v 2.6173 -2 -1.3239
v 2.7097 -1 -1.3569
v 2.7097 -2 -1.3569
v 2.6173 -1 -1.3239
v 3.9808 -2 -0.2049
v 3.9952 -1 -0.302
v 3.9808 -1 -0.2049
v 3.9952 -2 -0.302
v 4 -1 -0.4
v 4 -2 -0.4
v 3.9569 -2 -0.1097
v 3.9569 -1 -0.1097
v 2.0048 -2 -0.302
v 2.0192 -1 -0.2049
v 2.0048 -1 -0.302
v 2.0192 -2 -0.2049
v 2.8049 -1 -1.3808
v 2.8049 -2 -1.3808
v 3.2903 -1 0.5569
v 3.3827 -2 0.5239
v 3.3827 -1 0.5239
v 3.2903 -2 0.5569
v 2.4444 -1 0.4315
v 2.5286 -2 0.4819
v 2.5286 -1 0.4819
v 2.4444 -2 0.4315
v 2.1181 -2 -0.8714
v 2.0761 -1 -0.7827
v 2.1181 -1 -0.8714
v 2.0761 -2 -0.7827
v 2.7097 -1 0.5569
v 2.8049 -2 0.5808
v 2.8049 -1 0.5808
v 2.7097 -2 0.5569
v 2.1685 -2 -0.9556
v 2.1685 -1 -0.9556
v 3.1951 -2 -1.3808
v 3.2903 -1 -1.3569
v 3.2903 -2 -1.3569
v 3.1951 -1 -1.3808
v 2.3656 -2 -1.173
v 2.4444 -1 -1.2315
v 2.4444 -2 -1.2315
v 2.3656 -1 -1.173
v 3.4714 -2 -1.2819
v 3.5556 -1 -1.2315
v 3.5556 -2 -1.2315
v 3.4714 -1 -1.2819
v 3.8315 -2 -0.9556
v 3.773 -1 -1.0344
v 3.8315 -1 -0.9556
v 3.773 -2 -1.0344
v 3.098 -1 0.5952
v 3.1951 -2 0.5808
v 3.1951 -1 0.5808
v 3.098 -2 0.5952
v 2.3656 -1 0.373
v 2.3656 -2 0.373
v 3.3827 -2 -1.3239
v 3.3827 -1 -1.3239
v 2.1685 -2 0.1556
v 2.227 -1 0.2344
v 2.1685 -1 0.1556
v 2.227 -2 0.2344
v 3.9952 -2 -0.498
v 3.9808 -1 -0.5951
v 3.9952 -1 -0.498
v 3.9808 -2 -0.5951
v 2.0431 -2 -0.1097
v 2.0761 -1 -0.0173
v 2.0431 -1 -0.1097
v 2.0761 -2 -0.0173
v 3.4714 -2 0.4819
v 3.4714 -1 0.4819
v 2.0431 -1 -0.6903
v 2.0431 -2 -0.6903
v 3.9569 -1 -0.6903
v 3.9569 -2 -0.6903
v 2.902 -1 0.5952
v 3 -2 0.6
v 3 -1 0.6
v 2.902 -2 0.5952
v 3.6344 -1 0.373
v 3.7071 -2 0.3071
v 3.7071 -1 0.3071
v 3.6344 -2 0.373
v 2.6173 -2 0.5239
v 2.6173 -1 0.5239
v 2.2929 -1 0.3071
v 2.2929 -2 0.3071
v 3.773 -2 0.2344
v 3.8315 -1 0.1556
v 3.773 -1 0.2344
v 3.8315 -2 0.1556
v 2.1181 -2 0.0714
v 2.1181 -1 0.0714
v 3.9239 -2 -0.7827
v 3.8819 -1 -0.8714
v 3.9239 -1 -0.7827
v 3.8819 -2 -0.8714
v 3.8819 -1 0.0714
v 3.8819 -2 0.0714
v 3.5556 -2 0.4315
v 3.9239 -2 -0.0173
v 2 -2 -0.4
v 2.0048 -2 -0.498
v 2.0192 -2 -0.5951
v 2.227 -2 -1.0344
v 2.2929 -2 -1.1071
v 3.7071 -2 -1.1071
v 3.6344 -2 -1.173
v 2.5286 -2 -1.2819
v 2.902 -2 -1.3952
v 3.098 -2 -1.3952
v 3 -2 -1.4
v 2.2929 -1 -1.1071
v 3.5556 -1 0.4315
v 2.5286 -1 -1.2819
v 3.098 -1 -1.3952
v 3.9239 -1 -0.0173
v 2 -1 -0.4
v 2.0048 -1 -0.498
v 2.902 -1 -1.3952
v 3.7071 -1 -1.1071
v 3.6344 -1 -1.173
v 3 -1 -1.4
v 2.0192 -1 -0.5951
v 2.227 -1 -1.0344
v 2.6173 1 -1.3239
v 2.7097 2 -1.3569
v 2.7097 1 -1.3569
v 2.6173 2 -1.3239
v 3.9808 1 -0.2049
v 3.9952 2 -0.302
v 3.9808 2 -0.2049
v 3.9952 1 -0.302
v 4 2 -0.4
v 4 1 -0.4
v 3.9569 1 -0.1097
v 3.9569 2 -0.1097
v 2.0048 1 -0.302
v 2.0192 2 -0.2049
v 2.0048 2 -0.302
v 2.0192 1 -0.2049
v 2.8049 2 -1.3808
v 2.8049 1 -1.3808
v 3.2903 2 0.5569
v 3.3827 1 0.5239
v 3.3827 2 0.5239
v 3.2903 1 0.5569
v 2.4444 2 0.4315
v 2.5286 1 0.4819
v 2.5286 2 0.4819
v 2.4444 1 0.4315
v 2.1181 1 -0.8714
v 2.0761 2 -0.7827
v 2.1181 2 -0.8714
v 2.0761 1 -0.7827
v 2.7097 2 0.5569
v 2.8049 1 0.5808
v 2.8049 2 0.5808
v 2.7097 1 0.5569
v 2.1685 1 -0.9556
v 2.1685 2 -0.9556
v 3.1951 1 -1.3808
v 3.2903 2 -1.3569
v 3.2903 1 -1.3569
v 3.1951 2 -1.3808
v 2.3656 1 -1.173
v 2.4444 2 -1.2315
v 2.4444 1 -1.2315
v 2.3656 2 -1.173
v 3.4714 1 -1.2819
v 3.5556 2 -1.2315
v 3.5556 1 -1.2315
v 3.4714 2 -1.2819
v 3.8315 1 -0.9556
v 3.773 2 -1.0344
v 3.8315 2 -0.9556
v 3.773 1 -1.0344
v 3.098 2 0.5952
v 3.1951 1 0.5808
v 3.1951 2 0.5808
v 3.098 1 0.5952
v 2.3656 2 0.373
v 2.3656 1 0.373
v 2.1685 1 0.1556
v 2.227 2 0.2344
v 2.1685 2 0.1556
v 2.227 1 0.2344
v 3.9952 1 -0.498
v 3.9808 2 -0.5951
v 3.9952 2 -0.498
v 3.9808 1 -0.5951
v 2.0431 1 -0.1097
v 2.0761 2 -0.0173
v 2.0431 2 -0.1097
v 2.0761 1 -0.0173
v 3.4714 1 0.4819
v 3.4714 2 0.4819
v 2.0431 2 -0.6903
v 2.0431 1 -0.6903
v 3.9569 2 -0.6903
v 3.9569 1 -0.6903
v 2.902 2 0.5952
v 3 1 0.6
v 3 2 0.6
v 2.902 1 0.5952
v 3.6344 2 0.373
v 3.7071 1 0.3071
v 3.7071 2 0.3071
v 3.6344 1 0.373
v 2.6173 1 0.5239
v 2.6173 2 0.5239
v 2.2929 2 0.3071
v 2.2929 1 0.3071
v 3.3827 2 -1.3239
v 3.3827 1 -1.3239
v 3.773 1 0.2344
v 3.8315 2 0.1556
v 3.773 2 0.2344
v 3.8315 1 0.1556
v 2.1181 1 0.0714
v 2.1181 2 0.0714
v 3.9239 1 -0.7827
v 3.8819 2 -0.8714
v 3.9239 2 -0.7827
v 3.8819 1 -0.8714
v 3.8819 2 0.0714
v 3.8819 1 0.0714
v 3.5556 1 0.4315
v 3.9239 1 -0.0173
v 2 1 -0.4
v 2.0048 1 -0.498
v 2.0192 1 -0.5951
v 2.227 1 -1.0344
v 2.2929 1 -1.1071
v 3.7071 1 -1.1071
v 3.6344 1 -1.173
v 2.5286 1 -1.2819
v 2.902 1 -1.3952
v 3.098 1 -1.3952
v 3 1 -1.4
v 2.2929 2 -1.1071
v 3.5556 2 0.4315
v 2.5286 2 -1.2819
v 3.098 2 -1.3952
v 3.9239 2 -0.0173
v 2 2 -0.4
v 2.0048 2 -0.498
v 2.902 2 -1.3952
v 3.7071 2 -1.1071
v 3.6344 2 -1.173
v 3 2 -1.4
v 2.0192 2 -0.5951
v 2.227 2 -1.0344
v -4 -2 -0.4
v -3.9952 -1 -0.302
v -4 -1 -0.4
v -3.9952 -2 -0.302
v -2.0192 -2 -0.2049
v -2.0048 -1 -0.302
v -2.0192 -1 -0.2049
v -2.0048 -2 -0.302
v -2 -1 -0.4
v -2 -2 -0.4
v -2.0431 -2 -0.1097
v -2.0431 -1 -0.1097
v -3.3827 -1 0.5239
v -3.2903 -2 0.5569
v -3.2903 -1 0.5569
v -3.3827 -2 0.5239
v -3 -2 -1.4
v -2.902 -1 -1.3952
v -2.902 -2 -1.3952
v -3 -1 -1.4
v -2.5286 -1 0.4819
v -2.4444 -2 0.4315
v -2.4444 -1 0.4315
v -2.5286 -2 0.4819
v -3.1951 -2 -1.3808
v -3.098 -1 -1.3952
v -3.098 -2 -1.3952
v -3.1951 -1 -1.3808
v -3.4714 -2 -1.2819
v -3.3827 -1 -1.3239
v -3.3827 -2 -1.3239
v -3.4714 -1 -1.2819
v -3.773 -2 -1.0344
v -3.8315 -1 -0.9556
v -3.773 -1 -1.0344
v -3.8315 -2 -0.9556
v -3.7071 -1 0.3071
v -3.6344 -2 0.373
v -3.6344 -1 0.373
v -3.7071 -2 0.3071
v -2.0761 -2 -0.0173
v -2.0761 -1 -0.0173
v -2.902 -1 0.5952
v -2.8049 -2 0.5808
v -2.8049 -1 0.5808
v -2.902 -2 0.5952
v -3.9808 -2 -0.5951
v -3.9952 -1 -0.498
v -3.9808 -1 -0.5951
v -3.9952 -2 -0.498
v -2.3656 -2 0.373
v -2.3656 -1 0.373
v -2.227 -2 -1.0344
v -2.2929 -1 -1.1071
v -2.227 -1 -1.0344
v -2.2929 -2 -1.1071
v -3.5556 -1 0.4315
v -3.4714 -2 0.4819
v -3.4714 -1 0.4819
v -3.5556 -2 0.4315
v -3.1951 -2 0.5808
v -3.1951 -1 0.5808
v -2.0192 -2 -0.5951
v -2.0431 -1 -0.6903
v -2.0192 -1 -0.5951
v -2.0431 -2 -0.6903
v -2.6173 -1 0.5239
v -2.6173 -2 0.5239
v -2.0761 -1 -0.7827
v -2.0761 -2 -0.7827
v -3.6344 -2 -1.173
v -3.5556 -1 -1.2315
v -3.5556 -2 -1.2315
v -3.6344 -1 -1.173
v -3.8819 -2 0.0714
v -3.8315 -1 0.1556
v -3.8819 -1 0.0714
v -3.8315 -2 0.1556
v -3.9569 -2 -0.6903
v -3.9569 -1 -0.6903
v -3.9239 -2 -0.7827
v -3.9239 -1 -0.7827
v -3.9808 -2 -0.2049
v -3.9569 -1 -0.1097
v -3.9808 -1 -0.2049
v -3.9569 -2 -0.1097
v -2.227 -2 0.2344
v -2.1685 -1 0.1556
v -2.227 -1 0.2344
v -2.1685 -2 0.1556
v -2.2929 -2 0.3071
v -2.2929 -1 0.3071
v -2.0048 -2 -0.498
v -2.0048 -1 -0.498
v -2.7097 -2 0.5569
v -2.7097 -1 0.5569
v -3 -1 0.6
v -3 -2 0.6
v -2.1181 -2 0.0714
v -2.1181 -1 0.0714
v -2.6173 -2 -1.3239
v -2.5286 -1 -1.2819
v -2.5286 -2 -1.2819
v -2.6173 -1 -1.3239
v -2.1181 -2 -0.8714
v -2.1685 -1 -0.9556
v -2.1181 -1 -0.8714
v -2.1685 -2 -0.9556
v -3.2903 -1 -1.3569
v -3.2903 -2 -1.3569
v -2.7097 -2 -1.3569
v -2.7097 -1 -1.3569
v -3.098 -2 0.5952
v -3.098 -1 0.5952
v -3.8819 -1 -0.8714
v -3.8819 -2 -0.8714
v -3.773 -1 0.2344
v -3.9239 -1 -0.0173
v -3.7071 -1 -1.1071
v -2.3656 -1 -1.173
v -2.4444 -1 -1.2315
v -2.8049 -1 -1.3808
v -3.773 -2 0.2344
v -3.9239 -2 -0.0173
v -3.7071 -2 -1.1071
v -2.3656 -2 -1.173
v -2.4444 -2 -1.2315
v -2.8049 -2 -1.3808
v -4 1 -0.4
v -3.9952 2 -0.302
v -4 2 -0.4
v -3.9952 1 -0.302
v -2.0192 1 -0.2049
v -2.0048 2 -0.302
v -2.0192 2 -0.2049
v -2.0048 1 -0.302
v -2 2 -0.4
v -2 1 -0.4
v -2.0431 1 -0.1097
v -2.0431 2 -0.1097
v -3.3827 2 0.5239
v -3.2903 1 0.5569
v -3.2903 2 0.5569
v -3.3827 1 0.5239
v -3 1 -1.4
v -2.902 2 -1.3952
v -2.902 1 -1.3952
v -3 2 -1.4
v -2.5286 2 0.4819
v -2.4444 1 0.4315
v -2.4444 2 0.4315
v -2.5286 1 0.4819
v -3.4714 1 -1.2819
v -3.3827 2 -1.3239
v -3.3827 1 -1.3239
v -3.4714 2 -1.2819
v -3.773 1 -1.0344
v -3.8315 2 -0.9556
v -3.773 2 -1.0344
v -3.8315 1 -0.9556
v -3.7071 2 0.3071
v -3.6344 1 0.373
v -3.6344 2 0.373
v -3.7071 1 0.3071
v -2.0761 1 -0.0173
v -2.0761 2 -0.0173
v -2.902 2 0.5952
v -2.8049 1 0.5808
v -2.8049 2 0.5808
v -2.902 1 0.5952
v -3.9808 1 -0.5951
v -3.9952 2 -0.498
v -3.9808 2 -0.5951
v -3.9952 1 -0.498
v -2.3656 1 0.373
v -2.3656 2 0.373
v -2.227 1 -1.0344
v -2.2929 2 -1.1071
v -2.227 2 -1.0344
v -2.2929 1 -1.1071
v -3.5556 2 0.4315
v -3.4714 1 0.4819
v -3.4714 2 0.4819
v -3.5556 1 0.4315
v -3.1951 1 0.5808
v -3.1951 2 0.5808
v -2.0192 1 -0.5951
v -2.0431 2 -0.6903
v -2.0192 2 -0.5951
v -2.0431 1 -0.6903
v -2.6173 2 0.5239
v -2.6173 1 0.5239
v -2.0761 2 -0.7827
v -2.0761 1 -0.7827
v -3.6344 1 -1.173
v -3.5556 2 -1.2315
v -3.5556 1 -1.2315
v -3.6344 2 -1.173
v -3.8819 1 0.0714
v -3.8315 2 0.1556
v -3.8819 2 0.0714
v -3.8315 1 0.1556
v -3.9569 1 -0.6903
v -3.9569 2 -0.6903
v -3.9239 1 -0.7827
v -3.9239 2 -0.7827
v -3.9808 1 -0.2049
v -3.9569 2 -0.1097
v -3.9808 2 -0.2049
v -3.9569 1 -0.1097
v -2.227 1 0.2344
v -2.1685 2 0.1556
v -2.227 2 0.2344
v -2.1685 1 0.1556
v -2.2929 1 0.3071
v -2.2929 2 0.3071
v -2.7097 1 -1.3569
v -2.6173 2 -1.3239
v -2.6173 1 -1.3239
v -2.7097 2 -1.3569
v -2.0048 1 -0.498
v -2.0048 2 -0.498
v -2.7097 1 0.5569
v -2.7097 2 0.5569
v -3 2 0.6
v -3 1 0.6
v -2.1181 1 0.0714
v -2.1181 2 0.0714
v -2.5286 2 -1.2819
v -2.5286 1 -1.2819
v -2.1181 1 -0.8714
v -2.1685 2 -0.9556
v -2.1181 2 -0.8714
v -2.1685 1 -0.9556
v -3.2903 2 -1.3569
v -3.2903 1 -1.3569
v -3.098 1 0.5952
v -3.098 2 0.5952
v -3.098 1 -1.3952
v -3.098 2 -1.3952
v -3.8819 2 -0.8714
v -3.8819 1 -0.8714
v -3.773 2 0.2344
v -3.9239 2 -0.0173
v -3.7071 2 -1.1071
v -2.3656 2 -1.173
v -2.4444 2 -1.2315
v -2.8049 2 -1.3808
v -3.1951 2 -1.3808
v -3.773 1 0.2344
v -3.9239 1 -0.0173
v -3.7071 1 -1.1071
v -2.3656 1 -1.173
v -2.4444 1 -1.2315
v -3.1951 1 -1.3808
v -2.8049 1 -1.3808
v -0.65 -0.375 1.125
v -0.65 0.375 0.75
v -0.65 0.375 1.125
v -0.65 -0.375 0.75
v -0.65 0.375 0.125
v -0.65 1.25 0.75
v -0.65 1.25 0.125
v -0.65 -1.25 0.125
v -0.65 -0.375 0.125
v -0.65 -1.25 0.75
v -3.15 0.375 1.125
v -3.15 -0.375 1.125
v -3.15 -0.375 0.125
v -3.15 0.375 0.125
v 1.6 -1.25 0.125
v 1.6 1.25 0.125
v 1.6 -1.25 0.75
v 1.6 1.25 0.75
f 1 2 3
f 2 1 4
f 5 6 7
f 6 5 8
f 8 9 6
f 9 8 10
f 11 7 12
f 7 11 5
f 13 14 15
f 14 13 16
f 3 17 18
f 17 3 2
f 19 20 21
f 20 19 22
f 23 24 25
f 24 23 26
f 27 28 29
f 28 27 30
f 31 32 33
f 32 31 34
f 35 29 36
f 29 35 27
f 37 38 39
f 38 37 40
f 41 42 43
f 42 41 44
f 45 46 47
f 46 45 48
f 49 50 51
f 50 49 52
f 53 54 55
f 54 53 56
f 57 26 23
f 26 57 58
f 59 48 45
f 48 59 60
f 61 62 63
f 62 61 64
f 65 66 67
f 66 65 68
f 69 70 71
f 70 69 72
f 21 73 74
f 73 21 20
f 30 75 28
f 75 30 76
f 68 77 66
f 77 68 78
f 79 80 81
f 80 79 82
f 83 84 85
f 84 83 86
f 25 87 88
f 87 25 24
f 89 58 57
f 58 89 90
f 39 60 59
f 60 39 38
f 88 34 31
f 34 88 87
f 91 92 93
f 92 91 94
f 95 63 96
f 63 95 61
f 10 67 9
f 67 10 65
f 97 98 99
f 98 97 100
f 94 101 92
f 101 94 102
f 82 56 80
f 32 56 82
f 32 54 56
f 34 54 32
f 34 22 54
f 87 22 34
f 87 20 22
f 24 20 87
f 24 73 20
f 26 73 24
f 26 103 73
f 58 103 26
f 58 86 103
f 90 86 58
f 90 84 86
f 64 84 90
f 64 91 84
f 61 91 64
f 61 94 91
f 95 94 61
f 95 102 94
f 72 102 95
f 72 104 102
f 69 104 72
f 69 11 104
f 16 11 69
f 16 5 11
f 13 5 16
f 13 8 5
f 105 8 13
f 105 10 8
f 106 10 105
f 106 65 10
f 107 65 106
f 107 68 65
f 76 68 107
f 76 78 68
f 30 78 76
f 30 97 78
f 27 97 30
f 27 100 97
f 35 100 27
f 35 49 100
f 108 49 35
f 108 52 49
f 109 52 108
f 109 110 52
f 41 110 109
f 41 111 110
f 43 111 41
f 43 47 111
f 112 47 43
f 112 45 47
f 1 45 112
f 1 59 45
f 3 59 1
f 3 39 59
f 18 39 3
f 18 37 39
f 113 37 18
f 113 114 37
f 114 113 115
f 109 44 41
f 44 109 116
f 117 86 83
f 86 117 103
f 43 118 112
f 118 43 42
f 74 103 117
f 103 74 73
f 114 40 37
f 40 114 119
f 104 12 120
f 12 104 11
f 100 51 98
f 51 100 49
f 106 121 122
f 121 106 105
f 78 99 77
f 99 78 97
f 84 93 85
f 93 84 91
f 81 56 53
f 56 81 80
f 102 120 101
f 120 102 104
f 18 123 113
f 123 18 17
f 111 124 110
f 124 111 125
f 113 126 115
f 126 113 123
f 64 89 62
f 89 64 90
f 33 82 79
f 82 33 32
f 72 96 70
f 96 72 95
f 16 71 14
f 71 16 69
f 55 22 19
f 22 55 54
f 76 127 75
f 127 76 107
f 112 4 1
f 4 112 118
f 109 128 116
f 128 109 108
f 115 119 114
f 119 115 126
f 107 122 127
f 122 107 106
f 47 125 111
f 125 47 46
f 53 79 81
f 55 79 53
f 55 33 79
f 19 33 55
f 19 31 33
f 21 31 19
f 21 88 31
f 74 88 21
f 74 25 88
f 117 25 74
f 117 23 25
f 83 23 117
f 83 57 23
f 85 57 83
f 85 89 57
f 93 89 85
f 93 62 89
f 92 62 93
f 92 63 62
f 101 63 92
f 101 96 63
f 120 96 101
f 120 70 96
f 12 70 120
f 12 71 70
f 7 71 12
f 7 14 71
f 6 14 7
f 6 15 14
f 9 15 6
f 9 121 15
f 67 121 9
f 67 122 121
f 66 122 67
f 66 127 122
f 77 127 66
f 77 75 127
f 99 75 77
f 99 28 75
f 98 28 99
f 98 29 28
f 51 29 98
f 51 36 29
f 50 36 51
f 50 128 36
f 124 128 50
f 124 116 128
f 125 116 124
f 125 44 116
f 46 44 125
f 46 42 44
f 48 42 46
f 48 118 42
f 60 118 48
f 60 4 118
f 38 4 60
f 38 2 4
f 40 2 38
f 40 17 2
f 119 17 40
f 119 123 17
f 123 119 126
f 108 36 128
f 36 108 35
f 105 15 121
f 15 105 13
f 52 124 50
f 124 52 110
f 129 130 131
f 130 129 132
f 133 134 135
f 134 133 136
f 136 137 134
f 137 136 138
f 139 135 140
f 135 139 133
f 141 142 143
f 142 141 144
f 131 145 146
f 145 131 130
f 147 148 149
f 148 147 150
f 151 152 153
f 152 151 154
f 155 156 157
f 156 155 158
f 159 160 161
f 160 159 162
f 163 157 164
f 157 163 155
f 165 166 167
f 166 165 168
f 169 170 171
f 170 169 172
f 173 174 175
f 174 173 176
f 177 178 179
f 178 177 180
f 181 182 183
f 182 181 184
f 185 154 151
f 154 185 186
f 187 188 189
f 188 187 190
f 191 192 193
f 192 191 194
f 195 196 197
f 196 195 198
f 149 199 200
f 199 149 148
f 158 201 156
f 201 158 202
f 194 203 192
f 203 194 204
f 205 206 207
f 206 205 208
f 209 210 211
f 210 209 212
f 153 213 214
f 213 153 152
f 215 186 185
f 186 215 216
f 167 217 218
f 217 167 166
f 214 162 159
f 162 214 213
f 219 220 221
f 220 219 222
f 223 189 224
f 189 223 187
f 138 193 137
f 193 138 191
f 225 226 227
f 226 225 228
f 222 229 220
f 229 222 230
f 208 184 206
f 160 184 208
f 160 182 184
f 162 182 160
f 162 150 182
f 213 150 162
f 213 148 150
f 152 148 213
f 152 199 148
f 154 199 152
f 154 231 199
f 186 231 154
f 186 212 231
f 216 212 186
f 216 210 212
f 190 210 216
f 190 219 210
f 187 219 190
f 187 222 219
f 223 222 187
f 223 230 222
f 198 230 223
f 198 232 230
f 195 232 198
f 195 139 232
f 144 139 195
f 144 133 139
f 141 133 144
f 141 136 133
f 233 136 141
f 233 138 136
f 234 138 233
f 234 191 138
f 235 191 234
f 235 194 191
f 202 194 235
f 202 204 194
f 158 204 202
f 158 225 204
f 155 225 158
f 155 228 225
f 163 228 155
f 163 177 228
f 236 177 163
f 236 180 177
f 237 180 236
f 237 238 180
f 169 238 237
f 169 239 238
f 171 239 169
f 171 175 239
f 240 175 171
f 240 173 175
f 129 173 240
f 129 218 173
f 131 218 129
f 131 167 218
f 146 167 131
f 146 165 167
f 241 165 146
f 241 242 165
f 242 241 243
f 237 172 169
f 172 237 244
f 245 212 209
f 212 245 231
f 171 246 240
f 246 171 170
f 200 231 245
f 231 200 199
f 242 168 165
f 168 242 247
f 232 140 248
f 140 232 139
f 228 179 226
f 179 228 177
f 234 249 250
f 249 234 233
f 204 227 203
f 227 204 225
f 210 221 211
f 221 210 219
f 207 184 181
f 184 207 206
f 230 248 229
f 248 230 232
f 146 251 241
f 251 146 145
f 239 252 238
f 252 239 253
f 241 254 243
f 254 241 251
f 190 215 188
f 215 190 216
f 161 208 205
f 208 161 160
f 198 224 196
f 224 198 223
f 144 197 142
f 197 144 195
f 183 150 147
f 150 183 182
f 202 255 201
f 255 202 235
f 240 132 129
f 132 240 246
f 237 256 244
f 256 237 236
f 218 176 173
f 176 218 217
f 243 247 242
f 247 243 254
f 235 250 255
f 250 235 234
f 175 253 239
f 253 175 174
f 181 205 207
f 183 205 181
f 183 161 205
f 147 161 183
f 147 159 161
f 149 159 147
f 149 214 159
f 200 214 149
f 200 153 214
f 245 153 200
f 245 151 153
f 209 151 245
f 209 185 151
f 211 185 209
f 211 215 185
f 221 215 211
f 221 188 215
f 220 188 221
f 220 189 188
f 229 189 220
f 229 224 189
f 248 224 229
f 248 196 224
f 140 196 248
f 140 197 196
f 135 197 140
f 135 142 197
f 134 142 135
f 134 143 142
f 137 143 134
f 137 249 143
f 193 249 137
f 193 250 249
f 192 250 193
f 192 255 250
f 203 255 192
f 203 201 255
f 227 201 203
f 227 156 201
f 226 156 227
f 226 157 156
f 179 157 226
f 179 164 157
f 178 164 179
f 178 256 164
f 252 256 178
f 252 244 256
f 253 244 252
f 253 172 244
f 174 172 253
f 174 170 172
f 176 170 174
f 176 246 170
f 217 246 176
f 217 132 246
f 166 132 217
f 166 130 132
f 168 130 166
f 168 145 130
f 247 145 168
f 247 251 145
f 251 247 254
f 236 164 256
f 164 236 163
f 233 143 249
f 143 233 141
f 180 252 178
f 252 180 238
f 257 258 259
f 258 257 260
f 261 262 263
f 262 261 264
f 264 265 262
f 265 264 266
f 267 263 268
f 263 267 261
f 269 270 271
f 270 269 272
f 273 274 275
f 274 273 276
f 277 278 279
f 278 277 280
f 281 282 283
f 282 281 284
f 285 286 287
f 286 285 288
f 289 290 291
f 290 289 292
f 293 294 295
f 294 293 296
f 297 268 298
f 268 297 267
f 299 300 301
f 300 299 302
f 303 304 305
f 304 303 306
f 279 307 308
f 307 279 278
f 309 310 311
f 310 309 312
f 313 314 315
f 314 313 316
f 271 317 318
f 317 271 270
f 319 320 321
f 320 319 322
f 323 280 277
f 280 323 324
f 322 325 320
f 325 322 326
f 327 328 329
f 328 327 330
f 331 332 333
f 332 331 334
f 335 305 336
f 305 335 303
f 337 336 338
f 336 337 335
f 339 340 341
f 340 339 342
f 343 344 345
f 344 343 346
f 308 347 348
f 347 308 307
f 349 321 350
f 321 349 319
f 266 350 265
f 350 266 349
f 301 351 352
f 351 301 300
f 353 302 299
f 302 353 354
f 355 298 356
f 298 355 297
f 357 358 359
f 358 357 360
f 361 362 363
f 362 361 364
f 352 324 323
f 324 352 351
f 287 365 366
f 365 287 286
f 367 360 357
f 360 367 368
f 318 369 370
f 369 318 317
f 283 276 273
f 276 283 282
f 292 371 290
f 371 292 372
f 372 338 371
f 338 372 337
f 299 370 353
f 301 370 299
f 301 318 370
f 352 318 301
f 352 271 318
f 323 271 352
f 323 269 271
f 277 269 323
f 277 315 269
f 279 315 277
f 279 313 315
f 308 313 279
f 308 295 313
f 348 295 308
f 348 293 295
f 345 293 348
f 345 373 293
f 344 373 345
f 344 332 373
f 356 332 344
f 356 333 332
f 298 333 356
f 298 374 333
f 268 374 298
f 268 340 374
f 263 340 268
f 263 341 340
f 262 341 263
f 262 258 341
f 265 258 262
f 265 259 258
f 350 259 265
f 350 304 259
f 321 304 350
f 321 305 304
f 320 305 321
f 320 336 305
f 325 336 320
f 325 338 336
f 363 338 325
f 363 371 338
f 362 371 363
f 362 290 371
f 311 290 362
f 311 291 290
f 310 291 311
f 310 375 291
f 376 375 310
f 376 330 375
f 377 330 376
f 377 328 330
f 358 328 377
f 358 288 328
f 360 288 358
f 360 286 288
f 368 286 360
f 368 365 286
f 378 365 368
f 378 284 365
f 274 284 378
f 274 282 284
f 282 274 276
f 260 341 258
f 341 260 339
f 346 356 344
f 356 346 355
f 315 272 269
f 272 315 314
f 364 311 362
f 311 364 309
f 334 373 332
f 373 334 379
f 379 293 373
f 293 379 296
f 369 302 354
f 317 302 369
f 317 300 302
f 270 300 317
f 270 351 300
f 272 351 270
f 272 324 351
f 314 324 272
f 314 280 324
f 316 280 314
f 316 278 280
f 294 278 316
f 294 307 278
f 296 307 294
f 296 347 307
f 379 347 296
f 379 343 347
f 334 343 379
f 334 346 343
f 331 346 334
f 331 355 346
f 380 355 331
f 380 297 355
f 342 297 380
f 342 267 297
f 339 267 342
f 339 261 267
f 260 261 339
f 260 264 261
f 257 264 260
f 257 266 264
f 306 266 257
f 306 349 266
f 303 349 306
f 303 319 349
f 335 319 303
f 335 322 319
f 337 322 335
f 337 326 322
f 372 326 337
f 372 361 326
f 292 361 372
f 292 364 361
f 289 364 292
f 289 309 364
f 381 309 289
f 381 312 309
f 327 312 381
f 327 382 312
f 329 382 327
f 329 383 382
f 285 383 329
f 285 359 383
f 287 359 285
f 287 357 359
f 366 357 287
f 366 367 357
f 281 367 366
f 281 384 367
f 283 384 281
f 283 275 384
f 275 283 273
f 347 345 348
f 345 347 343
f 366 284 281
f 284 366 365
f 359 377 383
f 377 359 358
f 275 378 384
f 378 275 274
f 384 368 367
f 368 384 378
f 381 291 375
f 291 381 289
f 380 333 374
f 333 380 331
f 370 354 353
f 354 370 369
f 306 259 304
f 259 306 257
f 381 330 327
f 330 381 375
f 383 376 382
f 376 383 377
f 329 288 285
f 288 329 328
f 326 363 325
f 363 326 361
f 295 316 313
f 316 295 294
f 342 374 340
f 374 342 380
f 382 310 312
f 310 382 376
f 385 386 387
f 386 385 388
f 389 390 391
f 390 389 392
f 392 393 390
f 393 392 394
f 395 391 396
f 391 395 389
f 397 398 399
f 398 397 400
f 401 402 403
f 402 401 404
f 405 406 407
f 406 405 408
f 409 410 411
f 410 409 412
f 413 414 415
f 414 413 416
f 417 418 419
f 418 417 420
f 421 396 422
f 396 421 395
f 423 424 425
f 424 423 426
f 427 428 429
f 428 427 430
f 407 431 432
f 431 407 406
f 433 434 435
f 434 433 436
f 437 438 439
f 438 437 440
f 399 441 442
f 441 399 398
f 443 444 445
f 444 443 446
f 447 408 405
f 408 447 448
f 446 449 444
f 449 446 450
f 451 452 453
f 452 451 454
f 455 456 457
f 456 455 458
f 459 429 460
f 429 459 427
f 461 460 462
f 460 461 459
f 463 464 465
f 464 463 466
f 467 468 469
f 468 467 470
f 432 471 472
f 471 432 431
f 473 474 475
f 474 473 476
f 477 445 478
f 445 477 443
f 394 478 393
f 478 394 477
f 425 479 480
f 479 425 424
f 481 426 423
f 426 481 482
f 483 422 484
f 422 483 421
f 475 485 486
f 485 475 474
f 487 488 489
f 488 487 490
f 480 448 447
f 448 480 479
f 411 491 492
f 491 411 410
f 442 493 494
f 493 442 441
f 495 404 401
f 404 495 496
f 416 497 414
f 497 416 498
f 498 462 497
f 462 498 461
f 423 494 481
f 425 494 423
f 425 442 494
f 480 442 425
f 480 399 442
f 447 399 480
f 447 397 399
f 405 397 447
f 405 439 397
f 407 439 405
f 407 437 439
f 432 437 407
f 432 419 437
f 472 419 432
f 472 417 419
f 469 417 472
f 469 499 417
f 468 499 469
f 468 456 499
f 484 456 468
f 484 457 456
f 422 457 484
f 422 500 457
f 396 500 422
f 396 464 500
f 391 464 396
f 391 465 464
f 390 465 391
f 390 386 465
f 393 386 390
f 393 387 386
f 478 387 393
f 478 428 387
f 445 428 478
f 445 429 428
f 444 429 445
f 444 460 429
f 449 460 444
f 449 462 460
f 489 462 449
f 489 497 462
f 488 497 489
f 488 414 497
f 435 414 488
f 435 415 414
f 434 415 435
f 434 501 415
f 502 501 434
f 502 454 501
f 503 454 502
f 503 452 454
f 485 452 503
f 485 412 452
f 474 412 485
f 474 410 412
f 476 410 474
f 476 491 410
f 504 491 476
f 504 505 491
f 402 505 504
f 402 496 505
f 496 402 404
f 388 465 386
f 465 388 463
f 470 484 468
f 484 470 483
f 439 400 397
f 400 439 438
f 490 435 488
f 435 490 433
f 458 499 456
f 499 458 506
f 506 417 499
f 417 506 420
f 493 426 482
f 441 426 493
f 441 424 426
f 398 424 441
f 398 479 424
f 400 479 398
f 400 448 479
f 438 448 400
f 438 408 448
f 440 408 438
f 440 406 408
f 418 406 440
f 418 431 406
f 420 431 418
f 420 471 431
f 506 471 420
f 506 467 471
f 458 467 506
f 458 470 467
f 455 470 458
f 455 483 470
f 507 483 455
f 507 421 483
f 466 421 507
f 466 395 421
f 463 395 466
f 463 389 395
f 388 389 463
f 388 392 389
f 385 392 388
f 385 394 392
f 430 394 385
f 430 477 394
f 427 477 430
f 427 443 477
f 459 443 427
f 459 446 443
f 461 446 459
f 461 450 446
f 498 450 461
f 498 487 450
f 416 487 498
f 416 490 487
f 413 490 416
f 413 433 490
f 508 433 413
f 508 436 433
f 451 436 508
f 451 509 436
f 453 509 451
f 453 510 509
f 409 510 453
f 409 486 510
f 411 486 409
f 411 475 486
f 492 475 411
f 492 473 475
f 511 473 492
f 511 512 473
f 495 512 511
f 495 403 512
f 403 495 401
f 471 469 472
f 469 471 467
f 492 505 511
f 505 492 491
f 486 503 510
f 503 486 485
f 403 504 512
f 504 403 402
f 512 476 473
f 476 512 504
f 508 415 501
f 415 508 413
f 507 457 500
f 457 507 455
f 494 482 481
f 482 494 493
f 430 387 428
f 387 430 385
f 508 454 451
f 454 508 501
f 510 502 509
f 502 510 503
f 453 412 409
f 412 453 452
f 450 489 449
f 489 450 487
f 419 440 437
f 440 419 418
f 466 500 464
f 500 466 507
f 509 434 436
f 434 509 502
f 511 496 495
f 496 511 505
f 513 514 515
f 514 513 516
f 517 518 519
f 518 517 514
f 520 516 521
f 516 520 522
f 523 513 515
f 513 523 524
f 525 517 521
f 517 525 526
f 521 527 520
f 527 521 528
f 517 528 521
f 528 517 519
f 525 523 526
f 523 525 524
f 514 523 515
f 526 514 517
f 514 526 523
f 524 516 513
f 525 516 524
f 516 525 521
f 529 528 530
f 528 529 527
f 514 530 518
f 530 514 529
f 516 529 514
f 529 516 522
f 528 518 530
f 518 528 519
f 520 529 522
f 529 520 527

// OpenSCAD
$fn=64;

chassis_z = 0.125;

module chassis() {
     color("gray")
     linear_extrude( height=chassis_z, center=true, convexity=10) {
	  import("modified_chassis.dxf", layer="0");
     }
}

module wheel() {
     color("black")
	  cylinder( h=1, d=2);
}     

wheel_z = -0.4;

module wheels() {
     rotate( [90, 0, 0]) {
	  translate( [3, wheel_z, 1]) wheel();
	  translate( [3, wheel_z, -2]) wheel();
	  translate( [-3, wheel_z, 1]) wheel();
	  translate( [-3, wheel_z, -2]) wheel();
     }
}

mot_x = 2.5;
mot_y = 0.75;
mot_z = 1;

chassis_x = 7.4;

module motor() {
     translate( [(-chassis_x/2)+0.55, -mot_y/2, chassis_z])
	  color("yellow")
	  cube([mot_x, mot_y, mot_z]);
}

batt_x = 2.25;
batt_y = 2.50;
batt_z = 0.625;

module battery() {
     translate( [(-chassis_x/2)+0.55+mot_x, -batt_y/2, chassis_z])
	  color("#908020")
	  cube( [batt_x, batt_y, batt_z]);
}


module opto() {
     scale( [0.0394, 0.0394, 0.0394])
	  color("#800080")
	  import("TCRT5000.stl");
}


pcb_above_batt = 0.125;

// module pcb() {
//      translate( [0, 0, chassis_z+batt_z+pcb_above_batt]) {
// 	  // PCB outline from DXF
// 	  color("red")
// 	       linear_extrude( height=0.063, center=true, convexity=10) {
// 	       import("modified_chassis.dxf", layer="PCB");
// 	  }
// 	  // imported arduino from STL
// 	  color("cyan")
// 	       translate( [2, -0.35, 0.2])
// 	       rotate( [0, 0, 90])
// 	       scale( [0.0394, 0.0394, 0.0394])
// 	       import("Pro_Micro.stl");
// 	  //
// 	  rotate( [270, 0, 0])
// 	  translate( [3, 0, 1.4])
// 	  opto();
//      }
// }


chassis();
wheels();
motor();
battery();
// pcb();
